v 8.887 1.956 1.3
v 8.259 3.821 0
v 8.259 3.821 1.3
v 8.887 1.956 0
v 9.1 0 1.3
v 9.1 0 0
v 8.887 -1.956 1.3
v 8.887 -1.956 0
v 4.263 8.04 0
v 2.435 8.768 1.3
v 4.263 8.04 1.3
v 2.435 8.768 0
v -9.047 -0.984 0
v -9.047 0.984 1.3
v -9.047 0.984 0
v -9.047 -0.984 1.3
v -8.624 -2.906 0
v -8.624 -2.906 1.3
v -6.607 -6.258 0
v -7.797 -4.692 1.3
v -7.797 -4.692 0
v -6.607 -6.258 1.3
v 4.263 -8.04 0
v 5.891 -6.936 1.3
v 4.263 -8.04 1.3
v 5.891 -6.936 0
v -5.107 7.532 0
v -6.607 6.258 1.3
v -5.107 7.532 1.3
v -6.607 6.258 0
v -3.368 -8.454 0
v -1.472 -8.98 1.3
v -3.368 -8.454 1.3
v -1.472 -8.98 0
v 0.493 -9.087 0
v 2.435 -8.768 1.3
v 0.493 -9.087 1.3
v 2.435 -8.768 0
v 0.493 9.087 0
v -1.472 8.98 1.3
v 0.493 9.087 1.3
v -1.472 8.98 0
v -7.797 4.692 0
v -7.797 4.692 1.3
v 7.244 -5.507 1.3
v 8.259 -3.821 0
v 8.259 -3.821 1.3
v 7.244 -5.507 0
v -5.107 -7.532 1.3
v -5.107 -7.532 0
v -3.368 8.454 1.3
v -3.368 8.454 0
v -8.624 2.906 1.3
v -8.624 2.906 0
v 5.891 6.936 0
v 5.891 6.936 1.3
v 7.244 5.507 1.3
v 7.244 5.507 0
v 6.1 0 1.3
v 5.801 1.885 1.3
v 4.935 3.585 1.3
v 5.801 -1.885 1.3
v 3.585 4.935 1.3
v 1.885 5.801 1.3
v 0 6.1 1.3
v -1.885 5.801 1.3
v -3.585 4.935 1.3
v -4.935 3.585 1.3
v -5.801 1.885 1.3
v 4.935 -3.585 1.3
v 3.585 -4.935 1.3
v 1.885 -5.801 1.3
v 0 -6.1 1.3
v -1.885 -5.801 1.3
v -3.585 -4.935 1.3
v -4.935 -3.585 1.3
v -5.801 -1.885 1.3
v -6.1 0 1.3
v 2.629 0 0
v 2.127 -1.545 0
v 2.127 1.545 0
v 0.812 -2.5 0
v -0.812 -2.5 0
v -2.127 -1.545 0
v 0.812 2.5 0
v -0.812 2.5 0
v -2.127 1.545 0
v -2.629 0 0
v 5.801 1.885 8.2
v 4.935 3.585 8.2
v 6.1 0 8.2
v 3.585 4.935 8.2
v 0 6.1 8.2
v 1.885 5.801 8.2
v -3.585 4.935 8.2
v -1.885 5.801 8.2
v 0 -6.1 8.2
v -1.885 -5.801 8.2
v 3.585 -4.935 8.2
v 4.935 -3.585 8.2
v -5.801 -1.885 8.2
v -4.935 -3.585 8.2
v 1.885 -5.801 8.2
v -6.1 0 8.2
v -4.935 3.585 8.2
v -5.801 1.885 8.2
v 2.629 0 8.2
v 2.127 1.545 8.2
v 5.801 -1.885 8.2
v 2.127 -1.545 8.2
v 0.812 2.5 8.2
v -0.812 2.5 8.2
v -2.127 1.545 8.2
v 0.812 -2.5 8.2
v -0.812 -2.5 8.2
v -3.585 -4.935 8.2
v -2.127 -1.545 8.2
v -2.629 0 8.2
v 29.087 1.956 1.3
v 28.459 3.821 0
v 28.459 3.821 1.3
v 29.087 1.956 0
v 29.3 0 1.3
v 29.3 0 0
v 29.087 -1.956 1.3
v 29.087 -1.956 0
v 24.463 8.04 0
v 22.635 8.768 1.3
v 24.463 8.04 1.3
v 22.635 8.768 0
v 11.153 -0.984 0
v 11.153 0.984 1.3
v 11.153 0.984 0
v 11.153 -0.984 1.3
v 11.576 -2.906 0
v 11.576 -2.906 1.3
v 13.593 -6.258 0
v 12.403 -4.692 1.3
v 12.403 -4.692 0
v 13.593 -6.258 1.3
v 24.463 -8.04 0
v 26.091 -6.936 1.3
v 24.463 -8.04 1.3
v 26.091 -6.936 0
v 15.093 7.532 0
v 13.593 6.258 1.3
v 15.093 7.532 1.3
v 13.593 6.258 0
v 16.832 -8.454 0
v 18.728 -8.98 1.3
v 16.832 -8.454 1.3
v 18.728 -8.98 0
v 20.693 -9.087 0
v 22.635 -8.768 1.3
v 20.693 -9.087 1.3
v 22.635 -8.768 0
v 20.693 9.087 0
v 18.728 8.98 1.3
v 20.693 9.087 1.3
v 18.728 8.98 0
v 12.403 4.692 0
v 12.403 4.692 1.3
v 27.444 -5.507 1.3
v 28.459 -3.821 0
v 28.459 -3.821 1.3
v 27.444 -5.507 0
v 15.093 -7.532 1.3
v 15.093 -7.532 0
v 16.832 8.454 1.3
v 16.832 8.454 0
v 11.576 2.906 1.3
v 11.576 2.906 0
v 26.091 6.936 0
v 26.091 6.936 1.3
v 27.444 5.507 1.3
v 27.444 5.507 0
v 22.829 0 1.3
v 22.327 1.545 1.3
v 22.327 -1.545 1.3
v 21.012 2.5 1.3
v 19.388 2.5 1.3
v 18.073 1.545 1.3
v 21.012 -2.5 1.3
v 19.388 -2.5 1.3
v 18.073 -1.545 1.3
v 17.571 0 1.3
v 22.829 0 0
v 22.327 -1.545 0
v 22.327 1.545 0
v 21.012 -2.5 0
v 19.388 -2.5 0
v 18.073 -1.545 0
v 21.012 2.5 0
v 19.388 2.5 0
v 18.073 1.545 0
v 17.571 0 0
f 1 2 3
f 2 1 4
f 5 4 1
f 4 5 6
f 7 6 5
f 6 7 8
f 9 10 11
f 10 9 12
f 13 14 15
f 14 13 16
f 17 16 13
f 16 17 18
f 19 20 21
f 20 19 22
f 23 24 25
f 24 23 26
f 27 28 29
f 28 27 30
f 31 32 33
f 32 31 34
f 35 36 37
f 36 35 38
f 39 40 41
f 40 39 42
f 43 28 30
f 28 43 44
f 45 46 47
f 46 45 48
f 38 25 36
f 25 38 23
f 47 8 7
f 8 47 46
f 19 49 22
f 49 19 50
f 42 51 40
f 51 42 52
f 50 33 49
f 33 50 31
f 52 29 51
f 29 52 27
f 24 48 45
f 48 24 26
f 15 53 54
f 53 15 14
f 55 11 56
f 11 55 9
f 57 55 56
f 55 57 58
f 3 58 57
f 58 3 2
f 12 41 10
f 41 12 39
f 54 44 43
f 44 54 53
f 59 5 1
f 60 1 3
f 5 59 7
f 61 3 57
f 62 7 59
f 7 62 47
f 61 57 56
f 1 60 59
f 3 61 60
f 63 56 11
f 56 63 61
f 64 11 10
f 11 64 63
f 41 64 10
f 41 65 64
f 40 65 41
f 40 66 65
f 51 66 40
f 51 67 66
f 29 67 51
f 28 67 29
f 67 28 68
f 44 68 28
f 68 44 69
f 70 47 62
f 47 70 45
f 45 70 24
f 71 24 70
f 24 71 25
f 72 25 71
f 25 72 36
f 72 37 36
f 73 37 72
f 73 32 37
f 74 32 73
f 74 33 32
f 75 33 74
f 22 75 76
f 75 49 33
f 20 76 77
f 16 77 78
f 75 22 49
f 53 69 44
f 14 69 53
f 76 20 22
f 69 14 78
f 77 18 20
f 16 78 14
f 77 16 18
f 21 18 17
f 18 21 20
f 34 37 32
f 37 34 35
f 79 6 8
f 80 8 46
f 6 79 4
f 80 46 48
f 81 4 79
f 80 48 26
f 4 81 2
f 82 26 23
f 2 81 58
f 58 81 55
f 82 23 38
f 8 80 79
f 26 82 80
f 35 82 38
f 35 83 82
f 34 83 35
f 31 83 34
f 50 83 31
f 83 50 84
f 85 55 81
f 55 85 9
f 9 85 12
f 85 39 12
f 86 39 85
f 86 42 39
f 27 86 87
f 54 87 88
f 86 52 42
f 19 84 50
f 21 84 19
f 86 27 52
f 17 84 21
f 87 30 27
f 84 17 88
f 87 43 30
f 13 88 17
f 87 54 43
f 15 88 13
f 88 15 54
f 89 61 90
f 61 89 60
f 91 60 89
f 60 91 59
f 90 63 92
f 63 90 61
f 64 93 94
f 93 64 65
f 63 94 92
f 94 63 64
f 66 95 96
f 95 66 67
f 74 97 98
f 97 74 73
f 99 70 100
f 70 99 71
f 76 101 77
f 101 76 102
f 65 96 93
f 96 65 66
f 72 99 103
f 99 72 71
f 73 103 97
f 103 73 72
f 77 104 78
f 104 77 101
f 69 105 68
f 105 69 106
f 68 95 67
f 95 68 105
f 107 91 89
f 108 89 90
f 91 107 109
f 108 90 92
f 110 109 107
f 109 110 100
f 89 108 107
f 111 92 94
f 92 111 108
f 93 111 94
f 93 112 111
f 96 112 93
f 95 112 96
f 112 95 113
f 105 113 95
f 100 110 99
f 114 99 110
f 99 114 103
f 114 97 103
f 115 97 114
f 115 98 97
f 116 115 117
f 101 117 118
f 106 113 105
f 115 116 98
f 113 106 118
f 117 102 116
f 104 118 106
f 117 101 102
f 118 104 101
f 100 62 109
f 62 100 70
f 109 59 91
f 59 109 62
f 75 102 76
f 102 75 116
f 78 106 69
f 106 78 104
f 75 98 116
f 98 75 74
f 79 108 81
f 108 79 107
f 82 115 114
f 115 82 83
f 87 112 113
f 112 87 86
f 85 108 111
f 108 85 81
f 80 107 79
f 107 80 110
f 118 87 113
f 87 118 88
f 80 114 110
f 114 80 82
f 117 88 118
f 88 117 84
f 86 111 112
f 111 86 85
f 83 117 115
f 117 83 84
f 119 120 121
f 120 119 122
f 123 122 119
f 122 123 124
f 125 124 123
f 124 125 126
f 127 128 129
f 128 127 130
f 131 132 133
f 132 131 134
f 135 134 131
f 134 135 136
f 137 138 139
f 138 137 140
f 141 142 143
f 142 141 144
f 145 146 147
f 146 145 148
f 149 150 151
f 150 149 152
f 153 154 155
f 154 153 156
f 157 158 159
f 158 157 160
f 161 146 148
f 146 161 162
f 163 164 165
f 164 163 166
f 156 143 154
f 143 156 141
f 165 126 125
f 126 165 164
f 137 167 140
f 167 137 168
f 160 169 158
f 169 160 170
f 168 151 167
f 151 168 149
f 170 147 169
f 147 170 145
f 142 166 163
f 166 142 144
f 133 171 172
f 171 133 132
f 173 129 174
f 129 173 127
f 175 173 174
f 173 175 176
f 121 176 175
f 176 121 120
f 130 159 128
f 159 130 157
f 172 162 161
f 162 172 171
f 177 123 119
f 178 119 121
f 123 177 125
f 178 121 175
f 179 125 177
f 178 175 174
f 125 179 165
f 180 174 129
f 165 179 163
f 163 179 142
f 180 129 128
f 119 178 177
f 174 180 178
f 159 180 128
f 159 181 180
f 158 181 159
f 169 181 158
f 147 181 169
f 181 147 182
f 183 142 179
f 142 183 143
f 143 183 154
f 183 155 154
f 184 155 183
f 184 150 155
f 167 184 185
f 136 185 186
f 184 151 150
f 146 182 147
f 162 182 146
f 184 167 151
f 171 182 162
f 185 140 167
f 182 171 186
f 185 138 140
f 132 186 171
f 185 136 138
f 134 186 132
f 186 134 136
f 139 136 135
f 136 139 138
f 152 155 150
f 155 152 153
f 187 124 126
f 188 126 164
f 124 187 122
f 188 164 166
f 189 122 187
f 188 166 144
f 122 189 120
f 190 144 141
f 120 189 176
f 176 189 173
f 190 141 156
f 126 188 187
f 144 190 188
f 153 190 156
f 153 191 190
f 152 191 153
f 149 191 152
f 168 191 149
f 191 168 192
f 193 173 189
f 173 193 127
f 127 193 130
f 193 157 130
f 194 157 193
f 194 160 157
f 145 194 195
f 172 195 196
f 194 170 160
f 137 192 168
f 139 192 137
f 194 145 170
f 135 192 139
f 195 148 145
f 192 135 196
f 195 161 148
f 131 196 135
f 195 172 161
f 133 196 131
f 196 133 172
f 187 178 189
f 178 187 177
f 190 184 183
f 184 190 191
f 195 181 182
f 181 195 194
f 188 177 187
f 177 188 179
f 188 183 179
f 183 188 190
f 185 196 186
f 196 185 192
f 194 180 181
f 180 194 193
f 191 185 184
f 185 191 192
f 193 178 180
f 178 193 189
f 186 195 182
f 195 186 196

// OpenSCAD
//Radius = 10.55/2;
Radius = 12.2/2; // Radius of pulley
GuardSize = 3; // Extra radius of guard disk
Outer = Radius+GuardSize;
Height = 6.9; // Height between guards
Guard = 1.3; // Width (Z) of guard disk
Hole = 5; // Diameter of axle hole
Spacing = 2; // Distance between parts

Circ=2*Radius*PI;
N=Circ/Spacing;
Arc=360*(Circ/N)/Circ;

// By nophead
module polyhole( d, h )
{
n = max( round( 2 * d ), 3 );
rotate( [0, 0, 180] ) cylinder( h = h, r = ( d / 2 ) / cos( 180 / n ), $fn = n );
}

difference() {
    union() {
        cylinder(r=Outer, h=Guard); // guard
        translate([0, 0, Guard]) {
            cylinder(r=Radius, h=Height);
        }
    }
    polyhole(d=Hole, h=Height+Guard);
}

translate([Outer*2+Spacing, 0, 0]) difference() {
    cylinder(r=Outer, h=Guard); // guard
    polyhole(d=Hole, h=Height);
}
